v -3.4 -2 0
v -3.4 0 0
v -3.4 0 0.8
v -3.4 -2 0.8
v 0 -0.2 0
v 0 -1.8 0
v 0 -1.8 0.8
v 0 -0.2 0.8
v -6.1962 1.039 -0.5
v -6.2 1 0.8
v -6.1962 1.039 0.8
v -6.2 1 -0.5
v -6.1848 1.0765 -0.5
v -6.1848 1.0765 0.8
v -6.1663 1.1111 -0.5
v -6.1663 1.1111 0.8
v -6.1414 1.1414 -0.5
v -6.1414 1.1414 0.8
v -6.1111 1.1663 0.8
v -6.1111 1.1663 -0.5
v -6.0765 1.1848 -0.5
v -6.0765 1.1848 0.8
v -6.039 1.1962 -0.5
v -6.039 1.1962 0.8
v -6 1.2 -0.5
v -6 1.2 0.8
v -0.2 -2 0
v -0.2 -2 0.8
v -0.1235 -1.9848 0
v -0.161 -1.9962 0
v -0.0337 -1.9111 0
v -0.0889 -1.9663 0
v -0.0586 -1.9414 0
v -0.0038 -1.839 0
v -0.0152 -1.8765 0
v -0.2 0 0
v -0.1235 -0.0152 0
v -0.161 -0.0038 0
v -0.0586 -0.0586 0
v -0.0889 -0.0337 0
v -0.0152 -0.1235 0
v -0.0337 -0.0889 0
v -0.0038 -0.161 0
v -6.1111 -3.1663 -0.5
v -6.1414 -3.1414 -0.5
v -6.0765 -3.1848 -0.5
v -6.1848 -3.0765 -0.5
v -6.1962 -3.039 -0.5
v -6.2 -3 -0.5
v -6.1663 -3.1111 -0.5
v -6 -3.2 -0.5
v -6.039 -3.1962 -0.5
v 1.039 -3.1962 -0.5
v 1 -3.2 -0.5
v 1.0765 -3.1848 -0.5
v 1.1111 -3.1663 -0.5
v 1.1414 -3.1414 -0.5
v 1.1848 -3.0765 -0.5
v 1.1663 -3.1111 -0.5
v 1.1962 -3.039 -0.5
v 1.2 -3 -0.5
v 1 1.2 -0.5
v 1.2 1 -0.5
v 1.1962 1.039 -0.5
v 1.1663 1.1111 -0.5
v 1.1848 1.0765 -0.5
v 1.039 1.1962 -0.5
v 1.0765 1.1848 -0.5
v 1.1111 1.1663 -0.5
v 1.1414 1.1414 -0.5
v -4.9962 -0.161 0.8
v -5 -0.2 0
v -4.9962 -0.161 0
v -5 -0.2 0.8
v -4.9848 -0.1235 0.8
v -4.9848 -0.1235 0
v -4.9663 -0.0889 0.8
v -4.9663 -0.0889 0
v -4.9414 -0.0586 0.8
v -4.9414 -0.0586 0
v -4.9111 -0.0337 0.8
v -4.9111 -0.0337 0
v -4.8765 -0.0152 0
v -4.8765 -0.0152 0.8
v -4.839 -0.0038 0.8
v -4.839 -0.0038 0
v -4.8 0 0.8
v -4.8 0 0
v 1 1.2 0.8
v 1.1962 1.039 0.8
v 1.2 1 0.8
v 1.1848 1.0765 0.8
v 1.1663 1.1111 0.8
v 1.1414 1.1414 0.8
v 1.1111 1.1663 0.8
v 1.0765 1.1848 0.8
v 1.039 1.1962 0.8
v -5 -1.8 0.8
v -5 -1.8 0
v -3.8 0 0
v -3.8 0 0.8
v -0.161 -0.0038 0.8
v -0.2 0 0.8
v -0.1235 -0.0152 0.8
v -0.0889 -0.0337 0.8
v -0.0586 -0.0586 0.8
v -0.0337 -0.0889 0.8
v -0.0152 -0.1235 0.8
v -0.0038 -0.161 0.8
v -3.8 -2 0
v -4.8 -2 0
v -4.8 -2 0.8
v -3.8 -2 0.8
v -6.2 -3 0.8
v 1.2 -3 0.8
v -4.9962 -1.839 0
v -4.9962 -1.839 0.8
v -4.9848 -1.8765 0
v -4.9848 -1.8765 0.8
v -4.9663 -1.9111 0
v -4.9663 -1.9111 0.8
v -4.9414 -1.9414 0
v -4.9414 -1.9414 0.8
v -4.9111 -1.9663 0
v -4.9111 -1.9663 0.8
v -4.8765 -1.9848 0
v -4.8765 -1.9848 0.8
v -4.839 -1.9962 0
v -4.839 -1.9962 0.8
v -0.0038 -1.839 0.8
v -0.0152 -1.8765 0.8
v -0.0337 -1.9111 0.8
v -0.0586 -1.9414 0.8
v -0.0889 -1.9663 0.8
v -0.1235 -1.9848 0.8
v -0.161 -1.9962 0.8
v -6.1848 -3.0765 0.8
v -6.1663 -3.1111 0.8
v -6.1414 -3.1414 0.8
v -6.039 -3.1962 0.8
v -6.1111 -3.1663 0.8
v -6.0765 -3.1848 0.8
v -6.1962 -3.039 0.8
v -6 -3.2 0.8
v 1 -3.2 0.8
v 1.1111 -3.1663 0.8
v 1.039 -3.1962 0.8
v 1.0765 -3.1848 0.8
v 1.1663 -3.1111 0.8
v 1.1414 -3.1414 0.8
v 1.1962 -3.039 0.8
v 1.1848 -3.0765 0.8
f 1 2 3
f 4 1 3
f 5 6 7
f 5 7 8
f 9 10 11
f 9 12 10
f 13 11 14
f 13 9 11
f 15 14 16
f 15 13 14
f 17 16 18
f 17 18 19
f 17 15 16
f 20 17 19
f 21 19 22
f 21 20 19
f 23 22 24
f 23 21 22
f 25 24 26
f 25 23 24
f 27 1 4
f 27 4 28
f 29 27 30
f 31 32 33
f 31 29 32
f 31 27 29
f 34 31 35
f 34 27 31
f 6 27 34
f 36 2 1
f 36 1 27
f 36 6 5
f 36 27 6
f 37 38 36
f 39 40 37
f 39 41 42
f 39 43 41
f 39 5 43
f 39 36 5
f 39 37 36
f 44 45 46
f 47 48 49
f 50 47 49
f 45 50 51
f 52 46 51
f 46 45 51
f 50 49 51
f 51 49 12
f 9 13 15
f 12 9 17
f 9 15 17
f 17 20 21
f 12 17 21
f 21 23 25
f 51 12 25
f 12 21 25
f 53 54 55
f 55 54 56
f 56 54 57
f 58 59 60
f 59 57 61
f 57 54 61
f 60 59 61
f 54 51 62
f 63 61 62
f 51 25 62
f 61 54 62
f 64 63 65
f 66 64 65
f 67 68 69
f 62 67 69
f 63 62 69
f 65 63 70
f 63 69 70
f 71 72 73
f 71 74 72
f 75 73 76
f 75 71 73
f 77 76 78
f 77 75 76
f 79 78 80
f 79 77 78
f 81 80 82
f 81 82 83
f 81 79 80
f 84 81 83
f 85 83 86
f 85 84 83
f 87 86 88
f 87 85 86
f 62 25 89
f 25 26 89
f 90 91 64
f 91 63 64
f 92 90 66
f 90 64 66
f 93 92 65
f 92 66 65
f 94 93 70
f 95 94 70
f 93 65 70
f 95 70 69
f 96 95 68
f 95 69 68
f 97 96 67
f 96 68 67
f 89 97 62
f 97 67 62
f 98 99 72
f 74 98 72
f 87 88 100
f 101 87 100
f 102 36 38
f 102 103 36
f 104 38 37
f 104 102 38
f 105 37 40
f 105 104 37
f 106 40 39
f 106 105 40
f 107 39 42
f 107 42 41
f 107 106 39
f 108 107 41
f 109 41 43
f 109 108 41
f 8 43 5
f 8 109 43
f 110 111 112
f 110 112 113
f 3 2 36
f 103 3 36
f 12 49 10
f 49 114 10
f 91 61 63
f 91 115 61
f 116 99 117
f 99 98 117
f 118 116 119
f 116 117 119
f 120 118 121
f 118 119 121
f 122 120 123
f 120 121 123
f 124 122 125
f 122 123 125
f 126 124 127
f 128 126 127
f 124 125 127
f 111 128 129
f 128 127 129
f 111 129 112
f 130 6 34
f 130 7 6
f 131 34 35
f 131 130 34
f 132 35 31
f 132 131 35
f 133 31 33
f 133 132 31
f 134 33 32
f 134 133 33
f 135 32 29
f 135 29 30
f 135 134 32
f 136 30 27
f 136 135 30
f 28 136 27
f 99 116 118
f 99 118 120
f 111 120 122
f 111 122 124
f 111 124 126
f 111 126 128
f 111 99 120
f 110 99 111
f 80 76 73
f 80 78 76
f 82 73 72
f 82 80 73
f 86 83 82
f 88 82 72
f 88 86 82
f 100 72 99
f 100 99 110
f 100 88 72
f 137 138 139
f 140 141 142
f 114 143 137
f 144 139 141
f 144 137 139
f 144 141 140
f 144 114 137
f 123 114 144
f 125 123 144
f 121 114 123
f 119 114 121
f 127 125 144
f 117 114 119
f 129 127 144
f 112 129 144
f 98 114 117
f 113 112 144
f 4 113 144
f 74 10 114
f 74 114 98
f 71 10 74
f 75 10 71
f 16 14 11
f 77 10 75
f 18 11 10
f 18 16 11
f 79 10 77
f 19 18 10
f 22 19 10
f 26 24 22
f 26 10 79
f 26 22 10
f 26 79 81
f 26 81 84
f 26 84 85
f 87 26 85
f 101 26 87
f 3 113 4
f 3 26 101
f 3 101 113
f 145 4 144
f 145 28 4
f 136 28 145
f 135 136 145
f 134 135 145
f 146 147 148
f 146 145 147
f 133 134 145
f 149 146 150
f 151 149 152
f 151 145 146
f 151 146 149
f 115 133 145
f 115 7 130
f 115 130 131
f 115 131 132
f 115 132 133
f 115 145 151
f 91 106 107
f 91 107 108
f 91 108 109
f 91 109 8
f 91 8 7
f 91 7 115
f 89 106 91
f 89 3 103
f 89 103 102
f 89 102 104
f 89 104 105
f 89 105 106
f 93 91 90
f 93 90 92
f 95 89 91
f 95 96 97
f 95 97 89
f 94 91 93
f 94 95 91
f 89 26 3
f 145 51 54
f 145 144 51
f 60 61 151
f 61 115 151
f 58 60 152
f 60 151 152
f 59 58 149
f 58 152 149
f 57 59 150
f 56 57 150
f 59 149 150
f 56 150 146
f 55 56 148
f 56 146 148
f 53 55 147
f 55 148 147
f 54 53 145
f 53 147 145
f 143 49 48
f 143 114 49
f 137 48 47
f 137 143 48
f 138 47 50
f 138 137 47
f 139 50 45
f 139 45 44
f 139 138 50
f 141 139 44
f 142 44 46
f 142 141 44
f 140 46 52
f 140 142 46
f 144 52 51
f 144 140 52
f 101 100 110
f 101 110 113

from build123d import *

# Parameters (mm, degrees)
F0_W     = 7.400000114
F0_H     = 4.400000114
F0_W_2   = 5
F0_H_2   = 2
F1_DEPTH = 0.8
F2_DEPTH = 0.5
F4_R     = 0.2
F5_W     = 0.4
F5_H     = 0.8
F6_DEPTH = 2


# Not quite as in the source:
# - a feature names something its author has since deleted; it is built from what else it names


with BuildPart() as f1:
    # F0 (on Top) → F1 (new body)
    with BuildSketch(Plane.XY):
        with Locations((-2.5, -1)):
            Rectangle(F0_W, F0_H)
        with Locations((-2.5, -1)):
            Rectangle(F0_W_2, F0_H_2, mode=Mode.SUBTRACT)
    extrude(amount=F1_DEPTH)

    # F0 (on Top) → F2 (join)
    with BuildSketch(Plane.XY):
        with Locations((-2.5, -1)):
            Rectangle(F0_W, F0_H)
        with Locations((-2.5, -1)):
            Rectangle(F0_W_2, F0_H_2, mode=Mode.SUBTRACT)
        with Locations((-2.5, -1)):
            Rectangle(F0_W_2, F0_H_2)
    extrude(amount=-F2_DEPTH)

    # F4
    f4_edges = [f1.edges().sort_by_distance(p)[0] for p in [
        (-5, 0, 0.4),
        (0, 0, 0.4),
        (0, -2, 0.4),
        (-5, -2, 0.4),
        (-6.2, 1.2, 0.15),
        (1.2, 1.2, 0.15),
        (1.2, -3.2, 0.15),
        (-6.2, -3.2, 0.15),
    ]]
    fillet(f4_edges, radius=F4_R)

    # F5 (on face) → F6 (join, through all)
    with BuildSketch(Plane.XZ):
        with Locations((-3.6, 0.4)):
            Rectangle(F5_W, F5_H)
    extrude(amount=F6_DEPTH)


solid = f1.part
